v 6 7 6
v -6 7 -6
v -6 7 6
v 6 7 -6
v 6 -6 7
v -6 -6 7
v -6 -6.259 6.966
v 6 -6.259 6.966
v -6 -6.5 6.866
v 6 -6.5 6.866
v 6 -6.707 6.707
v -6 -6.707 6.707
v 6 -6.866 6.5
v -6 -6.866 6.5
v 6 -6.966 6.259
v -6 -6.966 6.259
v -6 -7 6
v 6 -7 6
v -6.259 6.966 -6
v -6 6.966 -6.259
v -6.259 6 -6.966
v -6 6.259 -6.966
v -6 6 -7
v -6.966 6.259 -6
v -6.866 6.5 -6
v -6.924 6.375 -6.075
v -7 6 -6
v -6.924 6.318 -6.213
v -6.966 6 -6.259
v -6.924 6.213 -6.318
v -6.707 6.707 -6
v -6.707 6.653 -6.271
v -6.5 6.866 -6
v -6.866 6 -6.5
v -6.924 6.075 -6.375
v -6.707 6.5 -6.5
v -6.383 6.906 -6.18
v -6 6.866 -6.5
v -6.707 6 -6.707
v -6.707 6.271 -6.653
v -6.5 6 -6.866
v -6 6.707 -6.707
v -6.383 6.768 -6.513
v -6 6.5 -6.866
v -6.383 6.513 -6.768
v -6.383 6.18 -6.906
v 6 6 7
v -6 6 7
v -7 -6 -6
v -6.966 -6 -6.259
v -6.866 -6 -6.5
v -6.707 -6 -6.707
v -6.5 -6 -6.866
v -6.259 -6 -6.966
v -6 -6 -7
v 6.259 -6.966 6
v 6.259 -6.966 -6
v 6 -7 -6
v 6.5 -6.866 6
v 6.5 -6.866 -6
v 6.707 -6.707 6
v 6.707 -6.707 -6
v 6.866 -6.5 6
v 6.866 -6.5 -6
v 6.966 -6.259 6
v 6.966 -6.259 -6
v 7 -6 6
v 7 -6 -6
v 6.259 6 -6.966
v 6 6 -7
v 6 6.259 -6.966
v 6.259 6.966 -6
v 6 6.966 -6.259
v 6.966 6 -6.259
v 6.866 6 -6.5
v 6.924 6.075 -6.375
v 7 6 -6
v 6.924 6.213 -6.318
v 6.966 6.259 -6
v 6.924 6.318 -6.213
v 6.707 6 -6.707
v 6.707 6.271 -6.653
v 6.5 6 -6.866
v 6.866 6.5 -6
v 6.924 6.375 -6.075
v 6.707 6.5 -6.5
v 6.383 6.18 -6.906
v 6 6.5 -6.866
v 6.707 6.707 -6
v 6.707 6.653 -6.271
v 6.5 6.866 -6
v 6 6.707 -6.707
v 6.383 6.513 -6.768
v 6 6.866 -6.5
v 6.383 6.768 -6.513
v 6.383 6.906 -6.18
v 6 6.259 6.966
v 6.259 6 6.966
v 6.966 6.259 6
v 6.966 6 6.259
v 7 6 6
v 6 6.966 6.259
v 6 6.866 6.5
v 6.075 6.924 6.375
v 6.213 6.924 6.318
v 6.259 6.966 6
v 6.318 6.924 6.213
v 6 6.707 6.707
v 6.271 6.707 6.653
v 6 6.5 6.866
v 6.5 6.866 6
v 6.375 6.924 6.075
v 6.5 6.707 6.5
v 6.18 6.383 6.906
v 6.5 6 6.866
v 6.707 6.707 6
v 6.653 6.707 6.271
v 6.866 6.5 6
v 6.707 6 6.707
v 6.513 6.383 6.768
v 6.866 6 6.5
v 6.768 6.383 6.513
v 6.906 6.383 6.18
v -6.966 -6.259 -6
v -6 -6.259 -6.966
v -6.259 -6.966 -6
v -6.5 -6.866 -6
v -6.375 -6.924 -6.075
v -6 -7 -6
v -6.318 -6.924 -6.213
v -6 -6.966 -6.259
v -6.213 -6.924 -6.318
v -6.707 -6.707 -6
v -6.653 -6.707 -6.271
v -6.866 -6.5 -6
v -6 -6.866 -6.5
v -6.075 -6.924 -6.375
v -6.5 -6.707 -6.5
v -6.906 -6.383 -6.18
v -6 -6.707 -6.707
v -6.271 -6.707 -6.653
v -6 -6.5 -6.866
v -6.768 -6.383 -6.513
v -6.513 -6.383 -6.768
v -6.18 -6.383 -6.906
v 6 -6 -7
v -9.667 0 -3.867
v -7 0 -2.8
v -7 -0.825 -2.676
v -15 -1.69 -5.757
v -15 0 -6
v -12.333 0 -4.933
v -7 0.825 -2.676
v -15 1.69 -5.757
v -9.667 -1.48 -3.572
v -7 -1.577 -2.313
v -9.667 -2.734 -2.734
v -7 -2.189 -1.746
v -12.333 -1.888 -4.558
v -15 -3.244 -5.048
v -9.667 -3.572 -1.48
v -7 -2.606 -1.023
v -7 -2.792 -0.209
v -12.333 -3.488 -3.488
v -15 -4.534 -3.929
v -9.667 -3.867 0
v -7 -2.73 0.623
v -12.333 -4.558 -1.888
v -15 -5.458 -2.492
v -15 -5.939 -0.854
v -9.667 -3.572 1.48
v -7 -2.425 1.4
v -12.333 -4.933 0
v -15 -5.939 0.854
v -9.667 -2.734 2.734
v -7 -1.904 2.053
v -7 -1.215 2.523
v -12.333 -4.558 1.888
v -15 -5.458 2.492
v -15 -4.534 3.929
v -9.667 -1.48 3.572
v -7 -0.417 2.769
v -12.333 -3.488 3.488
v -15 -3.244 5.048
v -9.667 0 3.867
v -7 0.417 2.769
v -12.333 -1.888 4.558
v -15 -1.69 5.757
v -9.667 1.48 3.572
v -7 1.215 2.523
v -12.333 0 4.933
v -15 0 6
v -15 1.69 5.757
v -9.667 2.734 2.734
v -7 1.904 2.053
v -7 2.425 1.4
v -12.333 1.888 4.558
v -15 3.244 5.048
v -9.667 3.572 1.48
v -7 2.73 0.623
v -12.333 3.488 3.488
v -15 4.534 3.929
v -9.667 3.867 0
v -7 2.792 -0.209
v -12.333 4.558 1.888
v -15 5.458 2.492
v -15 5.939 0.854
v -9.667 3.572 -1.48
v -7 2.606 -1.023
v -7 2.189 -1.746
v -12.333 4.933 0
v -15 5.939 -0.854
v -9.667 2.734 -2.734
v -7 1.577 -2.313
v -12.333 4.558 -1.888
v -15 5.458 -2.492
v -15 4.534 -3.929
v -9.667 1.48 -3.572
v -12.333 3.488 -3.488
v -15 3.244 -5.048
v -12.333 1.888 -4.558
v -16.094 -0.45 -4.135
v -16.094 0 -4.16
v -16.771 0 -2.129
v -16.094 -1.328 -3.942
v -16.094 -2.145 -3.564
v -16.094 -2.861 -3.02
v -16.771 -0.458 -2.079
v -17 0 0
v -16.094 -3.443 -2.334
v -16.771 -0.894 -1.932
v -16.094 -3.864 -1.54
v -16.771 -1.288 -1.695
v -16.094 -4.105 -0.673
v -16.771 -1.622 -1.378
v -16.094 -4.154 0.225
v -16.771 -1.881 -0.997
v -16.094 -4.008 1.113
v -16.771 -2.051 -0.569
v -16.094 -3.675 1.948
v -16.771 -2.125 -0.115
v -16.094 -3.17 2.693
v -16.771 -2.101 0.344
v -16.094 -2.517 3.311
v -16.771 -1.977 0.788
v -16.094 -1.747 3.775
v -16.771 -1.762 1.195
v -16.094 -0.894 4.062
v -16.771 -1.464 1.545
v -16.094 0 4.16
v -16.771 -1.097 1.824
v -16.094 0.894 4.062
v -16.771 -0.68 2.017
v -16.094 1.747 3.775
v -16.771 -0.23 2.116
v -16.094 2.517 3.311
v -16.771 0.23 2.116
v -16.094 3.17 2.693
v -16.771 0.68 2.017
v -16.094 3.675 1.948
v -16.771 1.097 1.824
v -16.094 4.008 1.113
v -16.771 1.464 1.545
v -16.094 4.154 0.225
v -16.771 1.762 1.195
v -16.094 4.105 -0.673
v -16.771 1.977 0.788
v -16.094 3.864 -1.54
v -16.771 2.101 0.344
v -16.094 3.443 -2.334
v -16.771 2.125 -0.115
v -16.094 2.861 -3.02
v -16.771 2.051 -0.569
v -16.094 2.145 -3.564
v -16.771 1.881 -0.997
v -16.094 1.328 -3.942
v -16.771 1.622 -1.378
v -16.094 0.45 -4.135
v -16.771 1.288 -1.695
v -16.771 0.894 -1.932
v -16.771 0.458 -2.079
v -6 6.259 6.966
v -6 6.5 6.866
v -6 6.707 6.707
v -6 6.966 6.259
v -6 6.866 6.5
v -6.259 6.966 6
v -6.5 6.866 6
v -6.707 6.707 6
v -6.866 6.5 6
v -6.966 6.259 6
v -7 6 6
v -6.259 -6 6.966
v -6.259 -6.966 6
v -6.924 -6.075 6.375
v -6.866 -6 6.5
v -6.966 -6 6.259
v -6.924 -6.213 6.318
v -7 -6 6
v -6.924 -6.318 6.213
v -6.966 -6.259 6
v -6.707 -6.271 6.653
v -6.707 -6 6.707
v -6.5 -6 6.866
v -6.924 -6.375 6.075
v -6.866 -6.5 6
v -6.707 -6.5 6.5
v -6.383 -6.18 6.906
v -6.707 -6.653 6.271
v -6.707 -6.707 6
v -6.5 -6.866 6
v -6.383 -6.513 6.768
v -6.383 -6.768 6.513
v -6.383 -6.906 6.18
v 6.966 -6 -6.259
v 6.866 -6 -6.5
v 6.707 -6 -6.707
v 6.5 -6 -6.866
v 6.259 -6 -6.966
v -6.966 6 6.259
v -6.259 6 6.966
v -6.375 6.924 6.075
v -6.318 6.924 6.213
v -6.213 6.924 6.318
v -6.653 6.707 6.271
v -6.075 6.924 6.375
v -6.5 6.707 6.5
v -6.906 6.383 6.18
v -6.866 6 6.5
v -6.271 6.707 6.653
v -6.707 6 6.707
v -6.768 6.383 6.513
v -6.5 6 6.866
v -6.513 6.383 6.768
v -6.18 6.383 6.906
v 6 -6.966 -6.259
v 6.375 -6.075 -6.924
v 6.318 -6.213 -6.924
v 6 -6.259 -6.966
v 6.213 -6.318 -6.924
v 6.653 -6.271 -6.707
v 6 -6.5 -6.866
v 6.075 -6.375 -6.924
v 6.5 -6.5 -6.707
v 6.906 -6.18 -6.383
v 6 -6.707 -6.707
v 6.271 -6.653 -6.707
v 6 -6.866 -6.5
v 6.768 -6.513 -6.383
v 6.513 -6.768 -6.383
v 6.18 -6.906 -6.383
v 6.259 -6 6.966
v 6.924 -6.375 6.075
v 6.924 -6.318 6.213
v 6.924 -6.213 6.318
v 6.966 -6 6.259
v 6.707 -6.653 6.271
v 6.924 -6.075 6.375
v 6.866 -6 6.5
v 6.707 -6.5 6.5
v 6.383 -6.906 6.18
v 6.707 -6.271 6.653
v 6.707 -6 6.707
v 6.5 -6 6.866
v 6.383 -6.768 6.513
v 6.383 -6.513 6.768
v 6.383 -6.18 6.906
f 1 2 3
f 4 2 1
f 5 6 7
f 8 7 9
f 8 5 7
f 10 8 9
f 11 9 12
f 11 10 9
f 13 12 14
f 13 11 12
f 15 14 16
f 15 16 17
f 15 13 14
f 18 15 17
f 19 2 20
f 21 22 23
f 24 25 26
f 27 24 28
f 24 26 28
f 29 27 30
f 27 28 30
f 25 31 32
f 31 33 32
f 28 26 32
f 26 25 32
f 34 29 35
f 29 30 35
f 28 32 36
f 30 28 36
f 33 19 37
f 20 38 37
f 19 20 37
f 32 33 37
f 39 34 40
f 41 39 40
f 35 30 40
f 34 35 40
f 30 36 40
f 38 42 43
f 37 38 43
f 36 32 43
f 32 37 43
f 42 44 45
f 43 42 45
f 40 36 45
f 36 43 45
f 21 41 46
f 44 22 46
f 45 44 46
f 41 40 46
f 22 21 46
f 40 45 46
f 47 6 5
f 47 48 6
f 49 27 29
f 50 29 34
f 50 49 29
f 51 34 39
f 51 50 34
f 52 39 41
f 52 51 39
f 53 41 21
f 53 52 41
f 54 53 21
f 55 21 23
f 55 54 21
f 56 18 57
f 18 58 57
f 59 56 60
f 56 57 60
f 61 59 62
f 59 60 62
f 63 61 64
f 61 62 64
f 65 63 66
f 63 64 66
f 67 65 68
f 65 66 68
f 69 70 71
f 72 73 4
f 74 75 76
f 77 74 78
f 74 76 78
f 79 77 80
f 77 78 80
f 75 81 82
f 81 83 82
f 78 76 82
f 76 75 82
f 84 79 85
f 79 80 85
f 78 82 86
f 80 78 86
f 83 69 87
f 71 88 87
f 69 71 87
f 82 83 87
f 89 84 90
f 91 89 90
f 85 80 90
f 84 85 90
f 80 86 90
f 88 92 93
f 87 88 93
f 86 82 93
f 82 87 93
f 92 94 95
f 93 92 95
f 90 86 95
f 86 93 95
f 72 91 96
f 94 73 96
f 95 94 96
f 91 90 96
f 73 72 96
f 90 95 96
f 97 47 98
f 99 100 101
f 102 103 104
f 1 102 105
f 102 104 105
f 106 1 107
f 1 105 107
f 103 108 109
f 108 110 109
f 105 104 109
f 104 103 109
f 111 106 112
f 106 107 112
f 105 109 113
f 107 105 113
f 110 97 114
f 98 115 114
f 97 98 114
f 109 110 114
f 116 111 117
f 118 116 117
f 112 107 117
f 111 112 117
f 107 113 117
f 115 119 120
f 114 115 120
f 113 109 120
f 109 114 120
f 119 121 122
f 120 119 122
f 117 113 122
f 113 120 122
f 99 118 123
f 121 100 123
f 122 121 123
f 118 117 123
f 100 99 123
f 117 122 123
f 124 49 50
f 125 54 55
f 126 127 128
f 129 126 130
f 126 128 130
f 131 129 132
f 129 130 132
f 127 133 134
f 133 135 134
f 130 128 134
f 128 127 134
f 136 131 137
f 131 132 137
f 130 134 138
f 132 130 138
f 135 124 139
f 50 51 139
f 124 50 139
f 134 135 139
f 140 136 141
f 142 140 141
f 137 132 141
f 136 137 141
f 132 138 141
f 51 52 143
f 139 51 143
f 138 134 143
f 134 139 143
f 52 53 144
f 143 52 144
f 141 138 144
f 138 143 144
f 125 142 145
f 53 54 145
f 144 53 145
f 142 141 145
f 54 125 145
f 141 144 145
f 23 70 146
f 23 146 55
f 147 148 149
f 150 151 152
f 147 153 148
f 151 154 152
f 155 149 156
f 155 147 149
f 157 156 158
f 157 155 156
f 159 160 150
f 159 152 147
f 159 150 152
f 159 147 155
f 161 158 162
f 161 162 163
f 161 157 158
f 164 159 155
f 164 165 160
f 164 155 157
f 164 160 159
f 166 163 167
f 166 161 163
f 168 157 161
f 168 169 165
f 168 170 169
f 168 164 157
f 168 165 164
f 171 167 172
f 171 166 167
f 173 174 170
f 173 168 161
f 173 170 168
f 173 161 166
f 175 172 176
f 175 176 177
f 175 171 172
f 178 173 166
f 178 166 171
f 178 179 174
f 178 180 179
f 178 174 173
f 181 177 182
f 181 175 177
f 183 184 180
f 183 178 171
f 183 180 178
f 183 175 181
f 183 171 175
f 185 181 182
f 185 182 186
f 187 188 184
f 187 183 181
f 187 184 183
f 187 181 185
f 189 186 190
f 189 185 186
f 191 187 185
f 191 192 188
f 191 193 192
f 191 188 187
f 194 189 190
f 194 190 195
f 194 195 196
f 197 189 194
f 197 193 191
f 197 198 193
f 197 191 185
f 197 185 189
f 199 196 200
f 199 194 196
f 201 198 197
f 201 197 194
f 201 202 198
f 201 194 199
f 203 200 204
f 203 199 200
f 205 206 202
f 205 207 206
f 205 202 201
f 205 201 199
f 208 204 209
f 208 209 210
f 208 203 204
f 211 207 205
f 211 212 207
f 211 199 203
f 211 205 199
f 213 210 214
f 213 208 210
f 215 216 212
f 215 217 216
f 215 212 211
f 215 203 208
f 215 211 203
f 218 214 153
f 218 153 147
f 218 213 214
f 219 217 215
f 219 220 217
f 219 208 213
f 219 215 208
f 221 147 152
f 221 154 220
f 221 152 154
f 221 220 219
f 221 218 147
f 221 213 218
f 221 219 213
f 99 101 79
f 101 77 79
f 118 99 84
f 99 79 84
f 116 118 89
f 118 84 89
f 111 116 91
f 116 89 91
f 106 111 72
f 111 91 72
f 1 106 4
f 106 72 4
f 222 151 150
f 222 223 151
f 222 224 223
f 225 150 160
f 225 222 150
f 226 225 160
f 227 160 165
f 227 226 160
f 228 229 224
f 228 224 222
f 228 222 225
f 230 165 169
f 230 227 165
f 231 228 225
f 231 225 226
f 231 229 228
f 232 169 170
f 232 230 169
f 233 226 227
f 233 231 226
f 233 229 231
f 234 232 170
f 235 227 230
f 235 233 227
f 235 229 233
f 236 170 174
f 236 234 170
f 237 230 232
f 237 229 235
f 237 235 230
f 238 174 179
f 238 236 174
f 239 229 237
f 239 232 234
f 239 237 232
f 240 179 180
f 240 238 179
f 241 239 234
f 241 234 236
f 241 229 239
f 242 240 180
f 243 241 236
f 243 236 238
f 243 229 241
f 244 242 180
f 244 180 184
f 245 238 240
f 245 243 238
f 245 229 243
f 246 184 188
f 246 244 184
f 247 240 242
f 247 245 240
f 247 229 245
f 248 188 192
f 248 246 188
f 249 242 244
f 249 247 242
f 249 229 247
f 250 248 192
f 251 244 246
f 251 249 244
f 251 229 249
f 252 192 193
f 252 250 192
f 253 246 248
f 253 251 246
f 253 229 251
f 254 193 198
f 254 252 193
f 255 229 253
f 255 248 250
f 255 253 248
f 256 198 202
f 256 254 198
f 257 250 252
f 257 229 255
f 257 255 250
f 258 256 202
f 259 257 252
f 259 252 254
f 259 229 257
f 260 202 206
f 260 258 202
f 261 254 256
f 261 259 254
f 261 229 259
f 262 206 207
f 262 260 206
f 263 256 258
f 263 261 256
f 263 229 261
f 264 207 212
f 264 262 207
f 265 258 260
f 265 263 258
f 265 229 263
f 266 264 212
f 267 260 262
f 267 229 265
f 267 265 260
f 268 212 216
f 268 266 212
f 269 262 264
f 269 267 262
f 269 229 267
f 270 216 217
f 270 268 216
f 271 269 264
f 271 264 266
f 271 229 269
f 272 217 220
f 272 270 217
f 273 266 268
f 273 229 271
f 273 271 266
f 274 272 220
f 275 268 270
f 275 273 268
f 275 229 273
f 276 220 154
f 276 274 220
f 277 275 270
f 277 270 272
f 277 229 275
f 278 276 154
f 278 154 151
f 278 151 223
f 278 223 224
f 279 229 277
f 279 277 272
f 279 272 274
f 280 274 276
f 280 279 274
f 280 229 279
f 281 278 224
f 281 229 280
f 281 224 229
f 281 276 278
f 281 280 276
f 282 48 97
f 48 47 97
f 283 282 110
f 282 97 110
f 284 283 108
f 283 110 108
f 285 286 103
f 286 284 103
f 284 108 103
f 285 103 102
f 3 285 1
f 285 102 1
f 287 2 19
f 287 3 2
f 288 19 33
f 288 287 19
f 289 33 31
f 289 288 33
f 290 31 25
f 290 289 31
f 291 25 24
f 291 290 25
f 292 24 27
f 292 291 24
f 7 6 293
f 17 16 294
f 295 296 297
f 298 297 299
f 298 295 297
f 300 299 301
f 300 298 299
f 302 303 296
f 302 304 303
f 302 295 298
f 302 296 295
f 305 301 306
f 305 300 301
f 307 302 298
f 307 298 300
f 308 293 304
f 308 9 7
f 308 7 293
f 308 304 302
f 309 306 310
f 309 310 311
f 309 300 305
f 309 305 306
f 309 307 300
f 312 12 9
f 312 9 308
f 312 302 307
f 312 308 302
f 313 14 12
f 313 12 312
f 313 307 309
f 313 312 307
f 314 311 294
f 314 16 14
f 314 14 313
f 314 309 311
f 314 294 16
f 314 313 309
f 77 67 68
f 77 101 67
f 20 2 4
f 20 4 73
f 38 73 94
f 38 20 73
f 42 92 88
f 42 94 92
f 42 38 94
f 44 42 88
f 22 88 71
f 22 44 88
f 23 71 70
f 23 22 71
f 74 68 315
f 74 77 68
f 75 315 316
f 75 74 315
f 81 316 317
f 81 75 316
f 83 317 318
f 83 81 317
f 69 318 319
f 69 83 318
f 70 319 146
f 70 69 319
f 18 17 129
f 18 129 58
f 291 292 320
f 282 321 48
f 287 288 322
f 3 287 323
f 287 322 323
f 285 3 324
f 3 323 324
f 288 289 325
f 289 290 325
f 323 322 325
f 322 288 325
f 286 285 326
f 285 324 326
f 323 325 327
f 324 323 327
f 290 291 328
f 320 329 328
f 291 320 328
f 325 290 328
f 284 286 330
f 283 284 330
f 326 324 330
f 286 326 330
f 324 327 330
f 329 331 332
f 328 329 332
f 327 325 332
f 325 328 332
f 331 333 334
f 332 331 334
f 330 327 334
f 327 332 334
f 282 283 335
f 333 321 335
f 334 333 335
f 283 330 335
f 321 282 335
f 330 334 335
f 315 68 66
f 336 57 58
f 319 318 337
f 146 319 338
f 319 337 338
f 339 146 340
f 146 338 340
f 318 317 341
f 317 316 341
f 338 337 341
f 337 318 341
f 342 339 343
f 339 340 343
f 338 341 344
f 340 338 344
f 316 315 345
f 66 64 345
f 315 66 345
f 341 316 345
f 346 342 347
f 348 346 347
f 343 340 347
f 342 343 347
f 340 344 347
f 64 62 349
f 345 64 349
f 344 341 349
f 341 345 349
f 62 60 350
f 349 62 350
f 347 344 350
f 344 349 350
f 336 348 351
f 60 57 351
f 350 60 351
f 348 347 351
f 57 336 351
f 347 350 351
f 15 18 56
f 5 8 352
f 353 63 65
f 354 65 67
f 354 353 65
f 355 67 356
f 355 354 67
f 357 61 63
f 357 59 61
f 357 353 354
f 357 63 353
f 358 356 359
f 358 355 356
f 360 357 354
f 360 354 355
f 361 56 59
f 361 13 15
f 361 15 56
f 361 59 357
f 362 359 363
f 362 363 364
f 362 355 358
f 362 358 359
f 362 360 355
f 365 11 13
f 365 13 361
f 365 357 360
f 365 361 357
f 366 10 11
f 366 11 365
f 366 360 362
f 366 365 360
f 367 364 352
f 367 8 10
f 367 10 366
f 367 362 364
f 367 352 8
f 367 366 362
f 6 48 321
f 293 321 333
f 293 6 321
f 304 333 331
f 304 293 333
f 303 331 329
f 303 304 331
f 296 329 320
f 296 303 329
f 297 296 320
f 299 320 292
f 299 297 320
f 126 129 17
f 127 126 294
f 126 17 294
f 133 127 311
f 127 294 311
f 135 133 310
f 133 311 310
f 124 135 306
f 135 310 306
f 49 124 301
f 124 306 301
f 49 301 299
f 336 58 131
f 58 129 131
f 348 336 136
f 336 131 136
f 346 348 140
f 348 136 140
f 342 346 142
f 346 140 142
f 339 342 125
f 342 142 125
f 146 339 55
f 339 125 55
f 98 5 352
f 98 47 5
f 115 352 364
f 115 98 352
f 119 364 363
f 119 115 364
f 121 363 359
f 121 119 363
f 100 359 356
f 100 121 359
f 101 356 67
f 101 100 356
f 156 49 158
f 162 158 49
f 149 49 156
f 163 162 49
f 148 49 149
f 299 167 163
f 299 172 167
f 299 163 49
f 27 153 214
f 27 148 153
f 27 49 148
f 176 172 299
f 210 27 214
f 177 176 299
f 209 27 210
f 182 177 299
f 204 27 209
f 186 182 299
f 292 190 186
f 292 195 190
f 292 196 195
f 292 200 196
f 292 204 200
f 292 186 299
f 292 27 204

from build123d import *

# Parameters (mm, degrees)
AUFSATZ_LINEAR_AUSTRAGEN2_DEPTH = 7
VERRUNDUNG2_R                   = 1


with BuildPart() as part:
    # Skizze1 → Rotation1 (revolve)
    with BuildSketch(Plane(origin=(0, 0, 0), x_dir=(1, 0, 0), z_dir=(0, 1, 0))):
        with BuildLine():
            Line((-7, 0), (-7, 2.8))
            Line((-7, 2.8), (-15, 6))
            ThreePointArc((-15, 6), (-16.486832981, 3.16227766), (-17, 0))
            Line((-17, 0), (-7, 0))
        make_face()
    revolve(axis=Axis((-7.719127457, 0, 0), (-1, 0, 0)))

    # Skizze1<3> → Aufsatz-Linear austragen2 (add, symmetric)
    with BuildSketch(Plane(origin=(0, 0, 0), x_dir=(1, 0, 0), z_dir=(0, 1, 0))):
        Polygon((-7, 7), (-7, 2.8), (-7, 0), (-7, -7), (7, -7), (7, 0), (7, 7), align=None)
    extrude(amount=AUFSATZ_LINEAR_AUSTRAGEN2_DEPTH, both=True)

    # Verrundung2
    verrundung2_edges = [part.edges().sort_by_distance(p)[0] for p in [
        (-7, 7, 0),
        (7, 7, 0),
        (7, -7, 0),
        (-7, -7, 0),
        (-7, 0, 7),
        (0, 7, 7),
        (7, 0, 7),
        (0, -7, 7),
        (7, 0, -7),
        (0, 7, -7),
        (-7, 0, -7),
        (0, -7, -7),
    ]]
    fillet(verrundung2_edges, radius=VERRUNDUNG2_R)


solid = part.part
